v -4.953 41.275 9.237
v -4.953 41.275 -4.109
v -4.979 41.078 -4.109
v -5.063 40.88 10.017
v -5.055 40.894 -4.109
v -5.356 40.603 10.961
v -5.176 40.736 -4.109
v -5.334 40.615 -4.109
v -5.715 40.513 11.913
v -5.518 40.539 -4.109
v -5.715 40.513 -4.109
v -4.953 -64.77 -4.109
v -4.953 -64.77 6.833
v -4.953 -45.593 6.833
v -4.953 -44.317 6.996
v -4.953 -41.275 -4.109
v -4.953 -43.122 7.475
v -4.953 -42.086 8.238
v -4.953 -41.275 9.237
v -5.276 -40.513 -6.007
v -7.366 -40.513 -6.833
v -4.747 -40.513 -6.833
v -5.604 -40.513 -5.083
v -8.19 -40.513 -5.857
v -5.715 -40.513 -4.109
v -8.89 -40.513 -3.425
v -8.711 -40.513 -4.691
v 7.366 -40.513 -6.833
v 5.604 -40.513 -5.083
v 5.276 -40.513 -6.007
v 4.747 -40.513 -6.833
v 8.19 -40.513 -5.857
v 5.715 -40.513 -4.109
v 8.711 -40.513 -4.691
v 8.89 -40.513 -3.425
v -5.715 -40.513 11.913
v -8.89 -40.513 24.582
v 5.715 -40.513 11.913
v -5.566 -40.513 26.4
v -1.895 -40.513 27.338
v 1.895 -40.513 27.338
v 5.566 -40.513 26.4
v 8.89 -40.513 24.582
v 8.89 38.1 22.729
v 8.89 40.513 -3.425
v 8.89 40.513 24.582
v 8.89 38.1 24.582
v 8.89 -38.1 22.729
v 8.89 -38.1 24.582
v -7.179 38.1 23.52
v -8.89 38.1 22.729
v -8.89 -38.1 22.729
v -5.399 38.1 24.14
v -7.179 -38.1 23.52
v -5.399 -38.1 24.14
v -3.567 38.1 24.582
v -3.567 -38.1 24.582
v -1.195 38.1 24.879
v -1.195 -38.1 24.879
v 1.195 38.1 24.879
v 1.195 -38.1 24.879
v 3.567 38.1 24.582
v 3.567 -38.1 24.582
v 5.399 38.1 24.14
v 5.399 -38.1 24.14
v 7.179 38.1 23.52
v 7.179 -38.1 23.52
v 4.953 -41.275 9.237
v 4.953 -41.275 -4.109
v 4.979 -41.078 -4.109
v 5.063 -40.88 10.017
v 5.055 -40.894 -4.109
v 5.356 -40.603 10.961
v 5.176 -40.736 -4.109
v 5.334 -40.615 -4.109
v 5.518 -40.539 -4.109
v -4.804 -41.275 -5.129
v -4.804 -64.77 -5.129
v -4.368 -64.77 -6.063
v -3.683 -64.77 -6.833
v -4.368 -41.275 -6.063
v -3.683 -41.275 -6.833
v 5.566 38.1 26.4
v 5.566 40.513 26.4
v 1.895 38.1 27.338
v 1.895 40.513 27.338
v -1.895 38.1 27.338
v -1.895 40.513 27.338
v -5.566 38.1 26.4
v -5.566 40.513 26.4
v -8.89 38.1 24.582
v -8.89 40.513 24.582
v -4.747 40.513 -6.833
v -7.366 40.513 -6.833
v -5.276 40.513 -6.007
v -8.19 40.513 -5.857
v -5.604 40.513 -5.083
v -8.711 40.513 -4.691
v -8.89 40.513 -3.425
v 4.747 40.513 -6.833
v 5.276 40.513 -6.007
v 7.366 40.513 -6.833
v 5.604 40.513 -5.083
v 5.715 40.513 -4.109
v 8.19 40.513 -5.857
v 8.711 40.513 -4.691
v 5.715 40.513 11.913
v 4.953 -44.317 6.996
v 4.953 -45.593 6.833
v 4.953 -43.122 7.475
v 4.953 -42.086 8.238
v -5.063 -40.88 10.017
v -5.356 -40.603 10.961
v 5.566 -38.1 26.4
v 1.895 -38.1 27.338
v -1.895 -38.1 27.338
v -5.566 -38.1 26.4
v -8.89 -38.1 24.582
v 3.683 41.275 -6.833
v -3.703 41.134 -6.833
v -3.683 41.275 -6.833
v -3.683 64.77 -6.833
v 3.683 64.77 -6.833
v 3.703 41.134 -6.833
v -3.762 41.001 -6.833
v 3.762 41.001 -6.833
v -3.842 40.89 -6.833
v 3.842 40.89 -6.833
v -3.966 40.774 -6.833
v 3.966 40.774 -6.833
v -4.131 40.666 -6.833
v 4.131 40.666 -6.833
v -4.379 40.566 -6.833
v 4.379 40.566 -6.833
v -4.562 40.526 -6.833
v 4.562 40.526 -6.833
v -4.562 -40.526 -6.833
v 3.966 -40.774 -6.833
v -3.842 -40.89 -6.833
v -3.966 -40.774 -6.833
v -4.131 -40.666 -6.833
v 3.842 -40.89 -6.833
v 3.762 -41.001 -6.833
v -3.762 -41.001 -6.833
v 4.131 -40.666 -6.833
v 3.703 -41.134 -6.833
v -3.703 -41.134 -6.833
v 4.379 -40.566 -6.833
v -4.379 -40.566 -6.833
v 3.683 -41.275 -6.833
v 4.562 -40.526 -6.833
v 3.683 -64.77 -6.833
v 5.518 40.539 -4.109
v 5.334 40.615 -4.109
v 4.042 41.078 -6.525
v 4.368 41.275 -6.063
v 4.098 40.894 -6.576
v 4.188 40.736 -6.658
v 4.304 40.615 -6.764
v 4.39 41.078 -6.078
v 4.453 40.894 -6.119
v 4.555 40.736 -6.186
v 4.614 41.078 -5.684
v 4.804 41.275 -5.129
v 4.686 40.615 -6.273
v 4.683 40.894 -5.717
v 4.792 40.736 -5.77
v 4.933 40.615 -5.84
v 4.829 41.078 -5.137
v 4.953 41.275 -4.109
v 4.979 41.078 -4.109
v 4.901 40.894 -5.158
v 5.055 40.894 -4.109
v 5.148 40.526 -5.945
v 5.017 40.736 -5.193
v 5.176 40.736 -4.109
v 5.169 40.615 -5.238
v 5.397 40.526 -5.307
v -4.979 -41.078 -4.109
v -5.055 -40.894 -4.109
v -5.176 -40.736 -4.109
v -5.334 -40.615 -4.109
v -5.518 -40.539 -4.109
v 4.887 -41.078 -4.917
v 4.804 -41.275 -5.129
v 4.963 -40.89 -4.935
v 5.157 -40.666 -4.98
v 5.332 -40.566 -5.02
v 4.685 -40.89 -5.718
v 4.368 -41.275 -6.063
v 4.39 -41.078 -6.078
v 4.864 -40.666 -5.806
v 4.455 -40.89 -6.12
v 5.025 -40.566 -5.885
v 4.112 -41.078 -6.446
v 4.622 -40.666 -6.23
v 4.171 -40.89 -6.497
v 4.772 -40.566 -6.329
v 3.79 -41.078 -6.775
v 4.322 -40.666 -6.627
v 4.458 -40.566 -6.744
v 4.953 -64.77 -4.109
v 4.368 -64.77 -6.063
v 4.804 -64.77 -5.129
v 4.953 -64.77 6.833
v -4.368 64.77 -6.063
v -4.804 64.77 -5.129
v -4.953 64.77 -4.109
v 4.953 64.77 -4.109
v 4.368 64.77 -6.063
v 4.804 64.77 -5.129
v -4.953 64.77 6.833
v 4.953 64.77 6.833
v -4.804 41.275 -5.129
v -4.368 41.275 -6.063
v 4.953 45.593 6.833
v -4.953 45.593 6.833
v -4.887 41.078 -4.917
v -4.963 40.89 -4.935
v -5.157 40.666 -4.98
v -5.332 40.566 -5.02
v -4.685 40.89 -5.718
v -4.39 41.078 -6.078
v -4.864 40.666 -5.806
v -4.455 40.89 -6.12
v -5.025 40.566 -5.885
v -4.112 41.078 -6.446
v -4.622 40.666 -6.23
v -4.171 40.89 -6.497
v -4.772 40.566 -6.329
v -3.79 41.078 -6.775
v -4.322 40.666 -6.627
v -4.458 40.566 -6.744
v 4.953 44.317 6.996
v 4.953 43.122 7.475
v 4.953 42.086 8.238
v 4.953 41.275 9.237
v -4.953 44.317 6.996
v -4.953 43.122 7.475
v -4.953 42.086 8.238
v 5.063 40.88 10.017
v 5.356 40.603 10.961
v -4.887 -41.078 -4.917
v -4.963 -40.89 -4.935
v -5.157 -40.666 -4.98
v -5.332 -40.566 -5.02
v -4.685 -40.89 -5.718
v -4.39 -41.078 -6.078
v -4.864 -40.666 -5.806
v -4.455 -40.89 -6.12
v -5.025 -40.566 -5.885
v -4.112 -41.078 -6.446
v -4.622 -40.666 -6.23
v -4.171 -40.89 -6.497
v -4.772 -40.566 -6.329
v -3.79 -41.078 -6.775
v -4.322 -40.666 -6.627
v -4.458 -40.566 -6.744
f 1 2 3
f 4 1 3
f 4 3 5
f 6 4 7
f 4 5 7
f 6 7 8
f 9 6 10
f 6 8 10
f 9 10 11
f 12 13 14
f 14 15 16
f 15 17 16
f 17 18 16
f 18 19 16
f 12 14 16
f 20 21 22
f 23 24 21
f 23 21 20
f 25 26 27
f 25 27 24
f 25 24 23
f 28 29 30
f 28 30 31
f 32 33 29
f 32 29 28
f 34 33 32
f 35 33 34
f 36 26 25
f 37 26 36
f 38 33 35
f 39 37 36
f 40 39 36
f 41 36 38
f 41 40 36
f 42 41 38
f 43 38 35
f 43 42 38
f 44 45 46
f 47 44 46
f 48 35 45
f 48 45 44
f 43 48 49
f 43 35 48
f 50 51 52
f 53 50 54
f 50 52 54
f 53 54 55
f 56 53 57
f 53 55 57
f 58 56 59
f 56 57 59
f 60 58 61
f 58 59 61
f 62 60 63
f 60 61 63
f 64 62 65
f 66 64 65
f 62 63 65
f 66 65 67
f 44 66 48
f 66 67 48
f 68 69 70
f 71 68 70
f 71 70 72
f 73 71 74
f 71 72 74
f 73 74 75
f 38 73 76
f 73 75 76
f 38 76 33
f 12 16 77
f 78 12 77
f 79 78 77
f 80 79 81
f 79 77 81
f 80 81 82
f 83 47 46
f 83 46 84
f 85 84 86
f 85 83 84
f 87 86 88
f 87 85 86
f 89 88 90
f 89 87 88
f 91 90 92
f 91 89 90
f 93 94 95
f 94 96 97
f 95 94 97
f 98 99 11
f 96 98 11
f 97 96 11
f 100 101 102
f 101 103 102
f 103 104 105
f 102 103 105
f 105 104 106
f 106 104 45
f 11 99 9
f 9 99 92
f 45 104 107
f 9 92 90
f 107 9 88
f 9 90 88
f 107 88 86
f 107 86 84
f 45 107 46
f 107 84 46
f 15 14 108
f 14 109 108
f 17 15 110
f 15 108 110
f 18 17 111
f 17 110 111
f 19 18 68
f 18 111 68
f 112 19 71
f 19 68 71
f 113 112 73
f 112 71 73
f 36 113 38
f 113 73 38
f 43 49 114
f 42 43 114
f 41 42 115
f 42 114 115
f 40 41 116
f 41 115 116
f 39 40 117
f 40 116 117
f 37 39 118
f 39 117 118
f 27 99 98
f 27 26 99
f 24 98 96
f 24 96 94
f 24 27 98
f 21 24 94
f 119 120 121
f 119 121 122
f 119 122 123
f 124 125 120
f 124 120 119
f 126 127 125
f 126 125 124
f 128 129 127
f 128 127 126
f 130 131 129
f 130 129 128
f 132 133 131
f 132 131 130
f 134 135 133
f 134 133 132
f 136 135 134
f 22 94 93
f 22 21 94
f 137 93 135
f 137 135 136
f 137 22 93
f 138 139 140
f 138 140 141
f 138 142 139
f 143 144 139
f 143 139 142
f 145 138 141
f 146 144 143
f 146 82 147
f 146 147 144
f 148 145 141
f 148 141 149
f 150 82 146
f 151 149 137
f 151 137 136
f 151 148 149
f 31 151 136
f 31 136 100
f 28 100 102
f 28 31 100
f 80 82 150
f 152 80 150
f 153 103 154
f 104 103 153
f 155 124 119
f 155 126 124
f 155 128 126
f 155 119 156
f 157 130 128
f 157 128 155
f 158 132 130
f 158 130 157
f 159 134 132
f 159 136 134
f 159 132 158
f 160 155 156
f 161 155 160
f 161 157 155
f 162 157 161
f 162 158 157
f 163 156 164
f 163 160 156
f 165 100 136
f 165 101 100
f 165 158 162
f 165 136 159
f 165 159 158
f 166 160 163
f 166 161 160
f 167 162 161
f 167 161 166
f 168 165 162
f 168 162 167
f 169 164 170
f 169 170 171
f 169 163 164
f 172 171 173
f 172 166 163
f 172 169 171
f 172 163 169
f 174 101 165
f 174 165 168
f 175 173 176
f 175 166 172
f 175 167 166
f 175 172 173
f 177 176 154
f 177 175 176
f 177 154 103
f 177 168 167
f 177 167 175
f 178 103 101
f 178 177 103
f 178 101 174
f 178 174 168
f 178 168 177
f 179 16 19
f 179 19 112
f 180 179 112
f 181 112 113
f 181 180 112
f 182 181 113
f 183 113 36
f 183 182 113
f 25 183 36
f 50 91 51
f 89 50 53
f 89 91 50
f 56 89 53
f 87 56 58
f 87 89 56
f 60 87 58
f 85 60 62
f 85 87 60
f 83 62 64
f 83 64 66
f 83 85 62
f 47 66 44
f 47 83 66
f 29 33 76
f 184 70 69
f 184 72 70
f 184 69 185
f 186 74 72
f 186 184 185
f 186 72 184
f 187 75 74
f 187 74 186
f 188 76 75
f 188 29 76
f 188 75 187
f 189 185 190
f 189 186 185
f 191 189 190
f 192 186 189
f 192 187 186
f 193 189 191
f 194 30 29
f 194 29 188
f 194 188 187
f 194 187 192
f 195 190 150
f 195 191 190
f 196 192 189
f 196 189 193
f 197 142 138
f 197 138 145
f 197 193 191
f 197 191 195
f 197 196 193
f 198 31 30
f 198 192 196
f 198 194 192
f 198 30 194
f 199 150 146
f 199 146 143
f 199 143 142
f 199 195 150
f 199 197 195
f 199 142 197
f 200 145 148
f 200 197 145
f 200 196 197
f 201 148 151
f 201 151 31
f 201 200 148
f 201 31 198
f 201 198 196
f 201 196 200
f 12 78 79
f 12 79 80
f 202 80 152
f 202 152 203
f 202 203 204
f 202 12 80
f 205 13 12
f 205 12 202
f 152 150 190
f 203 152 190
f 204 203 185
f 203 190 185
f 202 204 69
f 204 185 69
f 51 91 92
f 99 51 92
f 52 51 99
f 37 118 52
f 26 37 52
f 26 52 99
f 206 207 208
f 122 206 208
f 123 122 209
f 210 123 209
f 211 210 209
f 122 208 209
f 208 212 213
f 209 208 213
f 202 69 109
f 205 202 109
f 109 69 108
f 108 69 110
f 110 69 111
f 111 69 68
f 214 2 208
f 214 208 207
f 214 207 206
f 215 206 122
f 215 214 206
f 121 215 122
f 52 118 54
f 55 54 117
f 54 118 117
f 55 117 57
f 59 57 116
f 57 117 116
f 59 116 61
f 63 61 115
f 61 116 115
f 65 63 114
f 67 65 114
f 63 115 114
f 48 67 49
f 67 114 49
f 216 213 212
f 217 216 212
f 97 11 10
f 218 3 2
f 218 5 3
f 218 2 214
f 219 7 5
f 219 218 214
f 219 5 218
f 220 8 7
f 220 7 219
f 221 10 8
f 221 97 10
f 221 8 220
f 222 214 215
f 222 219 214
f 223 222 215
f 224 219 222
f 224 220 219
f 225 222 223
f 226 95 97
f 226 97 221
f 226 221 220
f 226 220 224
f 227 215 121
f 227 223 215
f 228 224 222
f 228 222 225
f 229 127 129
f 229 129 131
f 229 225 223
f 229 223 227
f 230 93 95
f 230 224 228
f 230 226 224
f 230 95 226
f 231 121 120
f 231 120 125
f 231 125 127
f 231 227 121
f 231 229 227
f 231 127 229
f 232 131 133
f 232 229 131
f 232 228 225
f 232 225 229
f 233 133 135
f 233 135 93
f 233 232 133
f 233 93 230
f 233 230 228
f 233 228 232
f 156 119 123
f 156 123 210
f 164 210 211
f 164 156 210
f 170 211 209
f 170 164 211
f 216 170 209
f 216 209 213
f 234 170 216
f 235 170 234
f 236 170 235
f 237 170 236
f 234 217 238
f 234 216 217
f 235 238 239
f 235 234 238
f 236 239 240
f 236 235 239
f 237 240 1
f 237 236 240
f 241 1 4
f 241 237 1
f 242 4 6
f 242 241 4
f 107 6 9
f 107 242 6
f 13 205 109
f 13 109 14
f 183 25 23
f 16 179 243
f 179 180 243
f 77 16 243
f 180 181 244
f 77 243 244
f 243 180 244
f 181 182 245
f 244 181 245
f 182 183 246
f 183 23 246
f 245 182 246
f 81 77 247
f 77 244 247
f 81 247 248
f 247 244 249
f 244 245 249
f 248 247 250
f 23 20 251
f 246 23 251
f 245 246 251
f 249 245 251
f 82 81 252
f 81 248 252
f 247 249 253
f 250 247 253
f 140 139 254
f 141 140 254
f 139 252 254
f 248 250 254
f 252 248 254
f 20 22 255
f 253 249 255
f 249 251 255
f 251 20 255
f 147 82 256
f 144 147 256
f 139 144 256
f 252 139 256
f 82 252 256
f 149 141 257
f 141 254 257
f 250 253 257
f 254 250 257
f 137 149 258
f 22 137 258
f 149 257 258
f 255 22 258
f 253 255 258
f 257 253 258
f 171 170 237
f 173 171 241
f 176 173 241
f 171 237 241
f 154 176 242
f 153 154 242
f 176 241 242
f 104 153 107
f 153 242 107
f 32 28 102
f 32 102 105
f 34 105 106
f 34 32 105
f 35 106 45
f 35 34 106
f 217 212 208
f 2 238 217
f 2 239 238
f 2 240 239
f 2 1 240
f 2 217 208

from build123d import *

# Parameters (mm, degrees)
F1_DEPTH = 40.513
F2_DEPTH = 38.1
F3_DEPTH = 64.77
F5_R     = 5.08
F6_R     = 0.762


with BuildPart() as f1:
    # F0 (on Front) → F1 (new body)
    with BuildSketch(Plane.XZ):
        with BuildLine():
            Line((8.89, 22.7287972945), (8.89, 24.5818064272))
            Line((8.89, 24.5818064272), (3.5665511583, 24.5818064272))
            ThreePointArc((3.5665511583, 24.5818064272), (6.2968108914, 23.8521946995), (8.89, 22.7287972945))
        make_face()
        with BuildLine():
            Line((3.5665511583, 24.5818064272), (8.89, 24.5818064272))
            ThreePointArc((8.89, 24.5818064272), (0, 27.4567800376), (-8.89, 24.5818064272))
            Line((-8.89, 24.5818064272), (-3.5665511583, 24.5818064272))
            ThreePointArc((-3.5665511583, 24.5818064272), (0, 24.9167800376), (3.5665511583, 24.5818064272))
        make_face()
        with BuildLine():
            ThreePointArc((8.89, 22.7287972945), (6.2968108914, 23.8521946995), (3.5665511583, 24.5818064272))
            Line((3.5665511583, 24.5818064272), (-3.5665511583, 24.5818064272))
            ThreePointArc((-3.5665511583, 24.5818064272), (-6.2968108914, 23.8521946995), (-8.89, 22.7287972945))
            Line((-8.89, 22.7287972945), (8.89, 22.7287972945))
        make_face()
        with BuildLine():
            Line((-3.5665511583, 24.5818064272), (3.5665511583, 24.5818064272))
            ThreePointArc((3.5665511583, 24.5818064272), (0, 24.9167800376), (-3.5665511583, 24.5818064272))
        make_face()
        with BuildLine():
            Line((8.89, -3.4254523647), (8.89, 22.7287972945))
            Line((8.89, 22.7287972945), (-8.89, 22.7287972945))
            Line((-8.89, 22.7287972945), (-8.89, -3.4254523647))
            ThreePointArc((-8.89, -3.4254523647), (-8.4916458882, -5.2919635487), (-7.366, -6.8332199624))
            Line((-7.366, -6.8332199624), (-4.953, -6.8332199624))
            Line((-4.953, -6.8332199624), (-4.953, -4.1093734175))
            Line((-4.953, -4.1093734175), (-4.953, 0))
            Line((-4.953, 0), (-4.953, 6.8332199624))
            Line((-4.953, 6.8332199624), (4.953, 6.8332199624))
            Line((4.953, 6.8332199624), (4.953, 0))
            Line((4.953, 0), (4.953, -4.1093734175))
            Line((4.953, -4.1093734175), (4.953, -6.8332199624))
            Line((4.953, -6.8332199624), (7.366, -6.8332199624))
            ThreePointArc((7.366, -6.8332199624), (8.4916458882, -5.2919635487), (8.89, -3.4254523647))
        make_face()
        with BuildLine():
            Line((-3.5665511583, 24.5818064272), (-8.89, 24.5818064272))
            Line((-8.89, 24.5818064272), (-8.89, 22.7287972945))
            ThreePointArc((-8.89, 22.7287972945), (-6.2968108914, 23.8521946995), (-3.5665511583, 24.5818064272))
        make_face()
        with BuildLine():
            Line((3.683, -6.8332199624), (4.953, -6.8332199624))
            Line((4.953, -6.8332199624), (4.953, -4.1093734175))
            ThreePointArc((4.953, -4.1093734175), (4.6198986953, -5.6120576825), (3.683, -6.8332199624))
        make_face()
        with BuildLine():
            Line((-3.683, -6.8332199624), (3.683, -6.8332199624))
            ThreePointArc((3.683, -6.8332199624), (4.6198986953, -5.6120576825), (4.953, -4.1093734175))
            Line((4.953, -4.1093734175), (4.953, 0))
            ThreePointArc((4.953, 0), (0, -4.953), (-4.953, 0))
            Line((-4.953, 0), (-4.953, -4.1093734175))
            ThreePointArc((-4.953, -4.1093734175), (-4.6198986953, -5.6120576825), (-3.683, -6.8332199624))
        make_face()
        with BuildLine():
            Line((-4.953, -4.1093734175), (-4.953, -6.8332199624))
            Line((-4.953, -6.8332199624), (-3.683, -6.8332199624))
            ThreePointArc((-3.683, -6.8332199624), (-4.6198986953, -5.6120576825), (-4.953, -4.1093734175))
        make_face()
        with BuildLine():
            ThreePointArc((-4.953, 0), (0, -4.953), (4.953, 0))
            ThreePointArc((4.953, 0), (0, 4.953), (-4.953, 0))
        make_face()
        with BuildLine():
            ThreePointArc((-4.953, 0), (0, 4.953), (4.953, 0))
            Line((4.953, 0), (4.953, 6.8332199624))
            Line((4.953, 6.8332199624), (-4.953, 6.8332199624))
            Line((-4.953, 6.8332199624), (-4.953, 0))
        make_face()
    extrude(amount=F1_DEPTH)

    # F0 (on Front) → F2 (cut)
    with BuildSketch(Plane.XZ):
        with BuildLine():
            Line((-3.5665511583, 24.5818064272), (-8.89, 24.5818064272))
            Line((-8.89, 24.5818064272), (-8.89, 22.7287972945))
            ThreePointArc((-8.89, 22.7287972945), (-6.2968108914, 23.8521946995), (-3.5665511583, 24.5818064272))
        make_face()
        with BuildLine():
            Line((3.5665511583, 24.5818064272), (8.89, 24.5818064272))
            ThreePointArc((8.89, 24.5818064272), (0, 27.4567800376), (-8.89, 24.5818064272))
            Line((-8.89, 24.5818064272), (-3.5665511583, 24.5818064272))
            ThreePointArc((-3.5665511583, 24.5818064272), (0, 24.9167800376), (3.5665511583, 24.5818064272))
        make_face()
        with BuildLine():
            Line((8.89, 22.7287972945), (8.89, 24.5818064272))
            Line((8.89, 24.5818064272), (3.5665511583, 24.5818064272))
            ThreePointArc((3.5665511583, 24.5818064272), (6.2968108914, 23.8521946995), (8.89, 22.7287972945))
        make_face()
    extrude(amount=F2_DEPTH, mode=Mode.SUBTRACT)

    # F0 (on Front) → F3 (join)
    with BuildSketch(Plane.XZ):
        with BuildLine():
            Line((-3.683, -6.8332199624), (3.683, -6.8332199624))
            ThreePointArc((3.683, -6.8332199624), (4.6198986953, -5.6120576825), (4.953, -4.1093734175))
            Line((4.953, -4.1093734175), (4.953, 0))
            ThreePointArc((4.953, 0), (0, -4.953), (-4.953, 0))
            Line((-4.953, 0), (-4.953, -4.1093734175))
            ThreePointArc((-4.953, -4.1093734175), (-4.6198986953, -5.6120576825), (-3.683, -6.8332199624))
        make_face()
        with BuildLine():
            ThreePointArc((-4.953, 0), (0, -4.953), (4.953, 0))
            ThreePointArc((4.953, 0), (0, 4.953), (-4.953, 0))
        make_face()
        with BuildLine():
            ThreePointArc((-4.953, 0), (0, 4.953), (4.953, 0))
            Line((4.953, 0), (4.953, 6.8332199624))
            Line((4.953, 6.8332199624), (-4.953, 6.8332199624))
            Line((-4.953, 6.8332199624), (-4.953, 0))
        make_face()
    extrude(amount=F3_DEPTH)

    # F4: F1 across plane


with BuildPart() as f1_1:
    add(f1.part)
    add(f1.part.mirror(Plane.XZ))

    # F5
    f5_edges = [f1_1.edges().sort_by_distance(p)[0] for p in [
        (0, -40.513, 6.83322),
        (0, 40.513, 6.83322),
    ]]
    fillet(f5_edges, radius=F5_R)

    # F6
    f6_edges = [f1_1.edges().sort_by_distance(p)[0] for p in [
        (-4.953, 40.513, 1.361923),
        (-4.619899, 40.513, -5.612058),
        (-4.953, -40.513, 1.361923),
        (-4.619899, -40.513, -5.612058),
        (4.619899, -40.513, -5.612058),
        (4.953, -40.513, 1.361923),
        (4.953, 40.513, 1.361923),
        (4.619899, 40.513, -5.612058),
        (-4.953, 40.513, 9.37322),
        (4.953, 40.513, 9.37322),
        (-4.953, -40.513, 9.37322),
        (4.953, -40.513, 9.37322),
    ]]
    fillet(f6_edges, radius=F6_R)


solid = f1_1.part
